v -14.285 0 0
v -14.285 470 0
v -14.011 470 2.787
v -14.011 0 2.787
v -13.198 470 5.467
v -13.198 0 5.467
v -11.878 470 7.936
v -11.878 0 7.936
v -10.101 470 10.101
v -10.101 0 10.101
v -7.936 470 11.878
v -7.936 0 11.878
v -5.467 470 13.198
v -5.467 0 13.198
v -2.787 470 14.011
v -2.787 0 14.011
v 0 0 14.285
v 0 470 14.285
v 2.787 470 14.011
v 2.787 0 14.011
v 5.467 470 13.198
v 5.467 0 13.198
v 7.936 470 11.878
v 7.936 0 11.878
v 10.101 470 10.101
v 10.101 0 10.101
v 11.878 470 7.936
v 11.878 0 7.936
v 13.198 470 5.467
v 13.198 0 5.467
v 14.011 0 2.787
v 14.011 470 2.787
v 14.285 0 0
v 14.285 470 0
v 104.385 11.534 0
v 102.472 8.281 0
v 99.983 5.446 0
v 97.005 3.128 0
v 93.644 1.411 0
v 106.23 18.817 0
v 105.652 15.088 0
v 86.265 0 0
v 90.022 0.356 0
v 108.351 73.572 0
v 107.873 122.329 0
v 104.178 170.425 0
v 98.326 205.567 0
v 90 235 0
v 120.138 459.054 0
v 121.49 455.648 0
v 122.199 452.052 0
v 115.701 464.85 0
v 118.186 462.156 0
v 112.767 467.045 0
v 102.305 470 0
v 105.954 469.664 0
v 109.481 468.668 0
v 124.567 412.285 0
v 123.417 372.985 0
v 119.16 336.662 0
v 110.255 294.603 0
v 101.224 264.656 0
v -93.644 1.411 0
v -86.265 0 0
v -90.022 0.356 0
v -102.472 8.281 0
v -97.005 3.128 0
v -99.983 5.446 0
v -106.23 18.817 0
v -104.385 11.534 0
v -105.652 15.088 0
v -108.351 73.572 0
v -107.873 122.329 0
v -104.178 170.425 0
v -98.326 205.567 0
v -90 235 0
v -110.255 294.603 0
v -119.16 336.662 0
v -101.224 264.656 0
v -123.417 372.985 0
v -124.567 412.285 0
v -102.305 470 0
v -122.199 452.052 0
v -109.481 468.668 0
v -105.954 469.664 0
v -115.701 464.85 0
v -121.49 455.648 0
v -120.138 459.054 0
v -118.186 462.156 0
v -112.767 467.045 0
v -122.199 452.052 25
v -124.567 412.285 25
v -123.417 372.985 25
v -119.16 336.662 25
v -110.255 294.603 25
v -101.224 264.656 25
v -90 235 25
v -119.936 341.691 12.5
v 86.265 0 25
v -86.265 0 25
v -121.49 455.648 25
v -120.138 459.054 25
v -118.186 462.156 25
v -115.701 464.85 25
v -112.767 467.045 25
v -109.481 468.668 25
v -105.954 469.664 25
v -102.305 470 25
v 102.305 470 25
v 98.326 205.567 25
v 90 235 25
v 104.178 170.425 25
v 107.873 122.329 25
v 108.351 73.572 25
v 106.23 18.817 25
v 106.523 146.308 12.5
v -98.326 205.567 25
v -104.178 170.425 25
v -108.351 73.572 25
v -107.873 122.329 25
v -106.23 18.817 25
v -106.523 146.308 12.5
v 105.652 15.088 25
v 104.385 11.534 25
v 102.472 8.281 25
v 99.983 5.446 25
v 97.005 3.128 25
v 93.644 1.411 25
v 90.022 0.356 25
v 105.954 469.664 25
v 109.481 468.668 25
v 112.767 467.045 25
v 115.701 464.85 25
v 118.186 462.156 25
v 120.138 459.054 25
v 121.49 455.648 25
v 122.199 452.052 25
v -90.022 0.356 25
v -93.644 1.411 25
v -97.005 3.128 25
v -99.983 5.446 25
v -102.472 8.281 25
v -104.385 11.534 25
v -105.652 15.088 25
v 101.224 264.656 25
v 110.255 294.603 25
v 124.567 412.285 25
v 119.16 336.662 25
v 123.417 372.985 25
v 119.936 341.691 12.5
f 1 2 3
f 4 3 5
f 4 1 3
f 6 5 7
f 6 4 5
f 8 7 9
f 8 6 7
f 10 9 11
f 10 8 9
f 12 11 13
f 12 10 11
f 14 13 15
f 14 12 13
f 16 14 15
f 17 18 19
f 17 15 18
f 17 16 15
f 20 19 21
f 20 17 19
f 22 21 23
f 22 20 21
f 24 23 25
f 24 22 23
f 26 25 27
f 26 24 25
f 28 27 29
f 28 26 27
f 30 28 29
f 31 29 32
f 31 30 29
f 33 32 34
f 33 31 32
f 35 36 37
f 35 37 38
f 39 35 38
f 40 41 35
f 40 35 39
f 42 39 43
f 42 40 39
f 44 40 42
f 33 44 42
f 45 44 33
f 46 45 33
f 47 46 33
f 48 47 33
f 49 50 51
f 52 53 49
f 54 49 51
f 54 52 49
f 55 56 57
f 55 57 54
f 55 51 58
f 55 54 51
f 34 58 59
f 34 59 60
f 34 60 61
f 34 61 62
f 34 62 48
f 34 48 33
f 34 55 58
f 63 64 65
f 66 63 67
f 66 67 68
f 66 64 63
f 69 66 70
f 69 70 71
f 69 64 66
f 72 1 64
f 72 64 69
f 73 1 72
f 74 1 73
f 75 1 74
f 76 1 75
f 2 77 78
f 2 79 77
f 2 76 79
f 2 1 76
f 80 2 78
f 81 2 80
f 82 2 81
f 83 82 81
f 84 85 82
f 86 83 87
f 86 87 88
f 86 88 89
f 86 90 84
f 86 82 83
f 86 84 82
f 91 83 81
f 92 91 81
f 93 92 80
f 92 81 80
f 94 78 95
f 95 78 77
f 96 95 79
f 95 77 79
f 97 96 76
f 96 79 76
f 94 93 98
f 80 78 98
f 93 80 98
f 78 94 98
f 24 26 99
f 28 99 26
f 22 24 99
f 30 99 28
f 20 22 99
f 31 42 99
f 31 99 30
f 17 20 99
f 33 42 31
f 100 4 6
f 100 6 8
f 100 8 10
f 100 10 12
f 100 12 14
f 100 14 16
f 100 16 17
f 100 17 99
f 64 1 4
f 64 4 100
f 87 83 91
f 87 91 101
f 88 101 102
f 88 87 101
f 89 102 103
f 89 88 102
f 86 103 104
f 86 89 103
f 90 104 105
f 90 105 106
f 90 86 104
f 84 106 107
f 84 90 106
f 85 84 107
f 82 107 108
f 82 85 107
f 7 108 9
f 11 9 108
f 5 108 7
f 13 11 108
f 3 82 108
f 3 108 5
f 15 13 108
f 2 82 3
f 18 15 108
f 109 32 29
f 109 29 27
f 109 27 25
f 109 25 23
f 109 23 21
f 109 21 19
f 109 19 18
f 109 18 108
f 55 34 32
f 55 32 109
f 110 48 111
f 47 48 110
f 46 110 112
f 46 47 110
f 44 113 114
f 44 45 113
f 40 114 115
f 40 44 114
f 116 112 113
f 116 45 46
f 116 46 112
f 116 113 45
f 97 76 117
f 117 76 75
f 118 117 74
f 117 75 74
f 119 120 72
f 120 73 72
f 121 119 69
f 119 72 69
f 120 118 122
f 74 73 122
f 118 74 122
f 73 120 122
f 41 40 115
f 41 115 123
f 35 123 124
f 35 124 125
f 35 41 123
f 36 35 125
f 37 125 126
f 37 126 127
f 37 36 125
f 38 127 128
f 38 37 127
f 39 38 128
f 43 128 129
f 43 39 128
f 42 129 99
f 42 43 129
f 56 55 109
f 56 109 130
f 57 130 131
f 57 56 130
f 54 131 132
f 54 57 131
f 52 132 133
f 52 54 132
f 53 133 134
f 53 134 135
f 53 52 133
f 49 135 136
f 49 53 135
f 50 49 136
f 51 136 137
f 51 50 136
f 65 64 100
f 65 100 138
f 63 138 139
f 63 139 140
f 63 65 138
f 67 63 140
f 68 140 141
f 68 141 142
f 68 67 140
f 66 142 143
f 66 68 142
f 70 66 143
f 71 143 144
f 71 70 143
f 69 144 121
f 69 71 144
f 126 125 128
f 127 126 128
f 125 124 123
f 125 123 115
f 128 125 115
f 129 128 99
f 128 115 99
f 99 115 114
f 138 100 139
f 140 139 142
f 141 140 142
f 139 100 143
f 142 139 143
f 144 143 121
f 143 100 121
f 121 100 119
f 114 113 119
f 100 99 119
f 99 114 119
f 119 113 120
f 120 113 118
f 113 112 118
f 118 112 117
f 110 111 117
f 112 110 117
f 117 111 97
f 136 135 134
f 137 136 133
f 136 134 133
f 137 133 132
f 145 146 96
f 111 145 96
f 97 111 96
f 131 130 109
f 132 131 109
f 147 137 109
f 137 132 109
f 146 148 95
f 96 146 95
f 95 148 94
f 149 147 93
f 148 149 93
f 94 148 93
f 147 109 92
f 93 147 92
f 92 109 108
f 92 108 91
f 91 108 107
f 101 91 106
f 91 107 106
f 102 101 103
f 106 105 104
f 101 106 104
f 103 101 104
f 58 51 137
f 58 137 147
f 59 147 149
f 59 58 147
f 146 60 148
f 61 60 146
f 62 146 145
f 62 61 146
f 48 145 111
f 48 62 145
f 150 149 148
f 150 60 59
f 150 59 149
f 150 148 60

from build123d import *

# Parameters (mm, degrees)
BOSS_EXTRUDE1_DEPTH = 25
SKETCH2_R           = 14.285
CUT_EXTRUDE1_DEPTH  = 487.882938036


with BuildPart() as part:
    # Sketch1 → Boss-Extrude1 (new body)
    with BuildSketch(Plane.XY):
        with BuildLine():
            Line((0, 470), (102.304530941, 470))
            ThreePointArc((102.304530941, 470), (115.701411141, 464.850037068), (122.198947697, 452.052360092))
            add(Edge.make_bspline(
                [(122.198947697, 452.052360092), (126.05707976, 414.653812215), (124.54872054, 341.079870989), (104.591114629, 269.95223882), (90, 235)],
                knots=[0.073881588, 0.073881588, 0.073881588, 0.073881588, 0.536940794, 1, 1, 1, 1], degree=3))
            add(Edge.make_bspline(
                [(90, 235), (98.310393886, 211.902473229), (109.325776263, 152.77450372), (109.130347847, 67.78070228), (106.22993094, 18.817343576)],
                knots=[0, 0, 0, 0, 0.470365123, 0.940730246, 0.940730246, 0.940730246, 0.940730246], degree=3))
            ThreePointArc((106.22993094, 18.817343576), (99.982560761, 5.445737249), (86.264928467, 0))
            Line((86.264928467, 0), (0, 0))
            Line((0, 0), (-86.264928467, 0))
            ThreePointArc((-86.264928467, 0), (-99.982560761, 5.445737249), (-106.22993094, 18.817343576))
            add(Edge.make_bspline(
                [(-90, 235), (-98.310393886, 211.902473229), (-109.325776263, 152.77450372), (-109.130347847, 67.78070228), (-106.22993094, 18.817343576)],
                knots=[0, 0, 0, 0, 0.470365123, 0.940730246, 0.940730246, 0.940730246, 0.940730246], degree=3))
            add(Edge.make_bspline(
                [(-122.198947697, 452.052360092), (-126.05707976, 414.653812215), (-124.54872054, 341.079870989), (-104.591114629, 269.95223882), (-90, 235)],
                knots=[0.073881588, 0.073881588, 0.073881588, 0.073881588, 0.536940794, 1, 1, 1, 1], degree=3))
            ThreePointArc((-122.198947697, 452.052360092), (-115.701411141, 464.850037068), (-102.304530941, 470))
            Line((-102.304530941, 470), (0, 470))
        make_face()
    extrude(amount=BOSS_EXTRUDE1_DEPTH)

    # Sketch2 → Cut-Extrude1 (cut, through all)
    with BuildSketch(Plane(origin=(0, 0, 0), x_dir=(1, 0, 0), z_dir=(0, 1, 0))):
        Circle(SKETCH2_R)
    extrude(amount=CUT_EXTRUDE1_DEPTH, mode=Mode.SUBTRACT)


solid = part.part
